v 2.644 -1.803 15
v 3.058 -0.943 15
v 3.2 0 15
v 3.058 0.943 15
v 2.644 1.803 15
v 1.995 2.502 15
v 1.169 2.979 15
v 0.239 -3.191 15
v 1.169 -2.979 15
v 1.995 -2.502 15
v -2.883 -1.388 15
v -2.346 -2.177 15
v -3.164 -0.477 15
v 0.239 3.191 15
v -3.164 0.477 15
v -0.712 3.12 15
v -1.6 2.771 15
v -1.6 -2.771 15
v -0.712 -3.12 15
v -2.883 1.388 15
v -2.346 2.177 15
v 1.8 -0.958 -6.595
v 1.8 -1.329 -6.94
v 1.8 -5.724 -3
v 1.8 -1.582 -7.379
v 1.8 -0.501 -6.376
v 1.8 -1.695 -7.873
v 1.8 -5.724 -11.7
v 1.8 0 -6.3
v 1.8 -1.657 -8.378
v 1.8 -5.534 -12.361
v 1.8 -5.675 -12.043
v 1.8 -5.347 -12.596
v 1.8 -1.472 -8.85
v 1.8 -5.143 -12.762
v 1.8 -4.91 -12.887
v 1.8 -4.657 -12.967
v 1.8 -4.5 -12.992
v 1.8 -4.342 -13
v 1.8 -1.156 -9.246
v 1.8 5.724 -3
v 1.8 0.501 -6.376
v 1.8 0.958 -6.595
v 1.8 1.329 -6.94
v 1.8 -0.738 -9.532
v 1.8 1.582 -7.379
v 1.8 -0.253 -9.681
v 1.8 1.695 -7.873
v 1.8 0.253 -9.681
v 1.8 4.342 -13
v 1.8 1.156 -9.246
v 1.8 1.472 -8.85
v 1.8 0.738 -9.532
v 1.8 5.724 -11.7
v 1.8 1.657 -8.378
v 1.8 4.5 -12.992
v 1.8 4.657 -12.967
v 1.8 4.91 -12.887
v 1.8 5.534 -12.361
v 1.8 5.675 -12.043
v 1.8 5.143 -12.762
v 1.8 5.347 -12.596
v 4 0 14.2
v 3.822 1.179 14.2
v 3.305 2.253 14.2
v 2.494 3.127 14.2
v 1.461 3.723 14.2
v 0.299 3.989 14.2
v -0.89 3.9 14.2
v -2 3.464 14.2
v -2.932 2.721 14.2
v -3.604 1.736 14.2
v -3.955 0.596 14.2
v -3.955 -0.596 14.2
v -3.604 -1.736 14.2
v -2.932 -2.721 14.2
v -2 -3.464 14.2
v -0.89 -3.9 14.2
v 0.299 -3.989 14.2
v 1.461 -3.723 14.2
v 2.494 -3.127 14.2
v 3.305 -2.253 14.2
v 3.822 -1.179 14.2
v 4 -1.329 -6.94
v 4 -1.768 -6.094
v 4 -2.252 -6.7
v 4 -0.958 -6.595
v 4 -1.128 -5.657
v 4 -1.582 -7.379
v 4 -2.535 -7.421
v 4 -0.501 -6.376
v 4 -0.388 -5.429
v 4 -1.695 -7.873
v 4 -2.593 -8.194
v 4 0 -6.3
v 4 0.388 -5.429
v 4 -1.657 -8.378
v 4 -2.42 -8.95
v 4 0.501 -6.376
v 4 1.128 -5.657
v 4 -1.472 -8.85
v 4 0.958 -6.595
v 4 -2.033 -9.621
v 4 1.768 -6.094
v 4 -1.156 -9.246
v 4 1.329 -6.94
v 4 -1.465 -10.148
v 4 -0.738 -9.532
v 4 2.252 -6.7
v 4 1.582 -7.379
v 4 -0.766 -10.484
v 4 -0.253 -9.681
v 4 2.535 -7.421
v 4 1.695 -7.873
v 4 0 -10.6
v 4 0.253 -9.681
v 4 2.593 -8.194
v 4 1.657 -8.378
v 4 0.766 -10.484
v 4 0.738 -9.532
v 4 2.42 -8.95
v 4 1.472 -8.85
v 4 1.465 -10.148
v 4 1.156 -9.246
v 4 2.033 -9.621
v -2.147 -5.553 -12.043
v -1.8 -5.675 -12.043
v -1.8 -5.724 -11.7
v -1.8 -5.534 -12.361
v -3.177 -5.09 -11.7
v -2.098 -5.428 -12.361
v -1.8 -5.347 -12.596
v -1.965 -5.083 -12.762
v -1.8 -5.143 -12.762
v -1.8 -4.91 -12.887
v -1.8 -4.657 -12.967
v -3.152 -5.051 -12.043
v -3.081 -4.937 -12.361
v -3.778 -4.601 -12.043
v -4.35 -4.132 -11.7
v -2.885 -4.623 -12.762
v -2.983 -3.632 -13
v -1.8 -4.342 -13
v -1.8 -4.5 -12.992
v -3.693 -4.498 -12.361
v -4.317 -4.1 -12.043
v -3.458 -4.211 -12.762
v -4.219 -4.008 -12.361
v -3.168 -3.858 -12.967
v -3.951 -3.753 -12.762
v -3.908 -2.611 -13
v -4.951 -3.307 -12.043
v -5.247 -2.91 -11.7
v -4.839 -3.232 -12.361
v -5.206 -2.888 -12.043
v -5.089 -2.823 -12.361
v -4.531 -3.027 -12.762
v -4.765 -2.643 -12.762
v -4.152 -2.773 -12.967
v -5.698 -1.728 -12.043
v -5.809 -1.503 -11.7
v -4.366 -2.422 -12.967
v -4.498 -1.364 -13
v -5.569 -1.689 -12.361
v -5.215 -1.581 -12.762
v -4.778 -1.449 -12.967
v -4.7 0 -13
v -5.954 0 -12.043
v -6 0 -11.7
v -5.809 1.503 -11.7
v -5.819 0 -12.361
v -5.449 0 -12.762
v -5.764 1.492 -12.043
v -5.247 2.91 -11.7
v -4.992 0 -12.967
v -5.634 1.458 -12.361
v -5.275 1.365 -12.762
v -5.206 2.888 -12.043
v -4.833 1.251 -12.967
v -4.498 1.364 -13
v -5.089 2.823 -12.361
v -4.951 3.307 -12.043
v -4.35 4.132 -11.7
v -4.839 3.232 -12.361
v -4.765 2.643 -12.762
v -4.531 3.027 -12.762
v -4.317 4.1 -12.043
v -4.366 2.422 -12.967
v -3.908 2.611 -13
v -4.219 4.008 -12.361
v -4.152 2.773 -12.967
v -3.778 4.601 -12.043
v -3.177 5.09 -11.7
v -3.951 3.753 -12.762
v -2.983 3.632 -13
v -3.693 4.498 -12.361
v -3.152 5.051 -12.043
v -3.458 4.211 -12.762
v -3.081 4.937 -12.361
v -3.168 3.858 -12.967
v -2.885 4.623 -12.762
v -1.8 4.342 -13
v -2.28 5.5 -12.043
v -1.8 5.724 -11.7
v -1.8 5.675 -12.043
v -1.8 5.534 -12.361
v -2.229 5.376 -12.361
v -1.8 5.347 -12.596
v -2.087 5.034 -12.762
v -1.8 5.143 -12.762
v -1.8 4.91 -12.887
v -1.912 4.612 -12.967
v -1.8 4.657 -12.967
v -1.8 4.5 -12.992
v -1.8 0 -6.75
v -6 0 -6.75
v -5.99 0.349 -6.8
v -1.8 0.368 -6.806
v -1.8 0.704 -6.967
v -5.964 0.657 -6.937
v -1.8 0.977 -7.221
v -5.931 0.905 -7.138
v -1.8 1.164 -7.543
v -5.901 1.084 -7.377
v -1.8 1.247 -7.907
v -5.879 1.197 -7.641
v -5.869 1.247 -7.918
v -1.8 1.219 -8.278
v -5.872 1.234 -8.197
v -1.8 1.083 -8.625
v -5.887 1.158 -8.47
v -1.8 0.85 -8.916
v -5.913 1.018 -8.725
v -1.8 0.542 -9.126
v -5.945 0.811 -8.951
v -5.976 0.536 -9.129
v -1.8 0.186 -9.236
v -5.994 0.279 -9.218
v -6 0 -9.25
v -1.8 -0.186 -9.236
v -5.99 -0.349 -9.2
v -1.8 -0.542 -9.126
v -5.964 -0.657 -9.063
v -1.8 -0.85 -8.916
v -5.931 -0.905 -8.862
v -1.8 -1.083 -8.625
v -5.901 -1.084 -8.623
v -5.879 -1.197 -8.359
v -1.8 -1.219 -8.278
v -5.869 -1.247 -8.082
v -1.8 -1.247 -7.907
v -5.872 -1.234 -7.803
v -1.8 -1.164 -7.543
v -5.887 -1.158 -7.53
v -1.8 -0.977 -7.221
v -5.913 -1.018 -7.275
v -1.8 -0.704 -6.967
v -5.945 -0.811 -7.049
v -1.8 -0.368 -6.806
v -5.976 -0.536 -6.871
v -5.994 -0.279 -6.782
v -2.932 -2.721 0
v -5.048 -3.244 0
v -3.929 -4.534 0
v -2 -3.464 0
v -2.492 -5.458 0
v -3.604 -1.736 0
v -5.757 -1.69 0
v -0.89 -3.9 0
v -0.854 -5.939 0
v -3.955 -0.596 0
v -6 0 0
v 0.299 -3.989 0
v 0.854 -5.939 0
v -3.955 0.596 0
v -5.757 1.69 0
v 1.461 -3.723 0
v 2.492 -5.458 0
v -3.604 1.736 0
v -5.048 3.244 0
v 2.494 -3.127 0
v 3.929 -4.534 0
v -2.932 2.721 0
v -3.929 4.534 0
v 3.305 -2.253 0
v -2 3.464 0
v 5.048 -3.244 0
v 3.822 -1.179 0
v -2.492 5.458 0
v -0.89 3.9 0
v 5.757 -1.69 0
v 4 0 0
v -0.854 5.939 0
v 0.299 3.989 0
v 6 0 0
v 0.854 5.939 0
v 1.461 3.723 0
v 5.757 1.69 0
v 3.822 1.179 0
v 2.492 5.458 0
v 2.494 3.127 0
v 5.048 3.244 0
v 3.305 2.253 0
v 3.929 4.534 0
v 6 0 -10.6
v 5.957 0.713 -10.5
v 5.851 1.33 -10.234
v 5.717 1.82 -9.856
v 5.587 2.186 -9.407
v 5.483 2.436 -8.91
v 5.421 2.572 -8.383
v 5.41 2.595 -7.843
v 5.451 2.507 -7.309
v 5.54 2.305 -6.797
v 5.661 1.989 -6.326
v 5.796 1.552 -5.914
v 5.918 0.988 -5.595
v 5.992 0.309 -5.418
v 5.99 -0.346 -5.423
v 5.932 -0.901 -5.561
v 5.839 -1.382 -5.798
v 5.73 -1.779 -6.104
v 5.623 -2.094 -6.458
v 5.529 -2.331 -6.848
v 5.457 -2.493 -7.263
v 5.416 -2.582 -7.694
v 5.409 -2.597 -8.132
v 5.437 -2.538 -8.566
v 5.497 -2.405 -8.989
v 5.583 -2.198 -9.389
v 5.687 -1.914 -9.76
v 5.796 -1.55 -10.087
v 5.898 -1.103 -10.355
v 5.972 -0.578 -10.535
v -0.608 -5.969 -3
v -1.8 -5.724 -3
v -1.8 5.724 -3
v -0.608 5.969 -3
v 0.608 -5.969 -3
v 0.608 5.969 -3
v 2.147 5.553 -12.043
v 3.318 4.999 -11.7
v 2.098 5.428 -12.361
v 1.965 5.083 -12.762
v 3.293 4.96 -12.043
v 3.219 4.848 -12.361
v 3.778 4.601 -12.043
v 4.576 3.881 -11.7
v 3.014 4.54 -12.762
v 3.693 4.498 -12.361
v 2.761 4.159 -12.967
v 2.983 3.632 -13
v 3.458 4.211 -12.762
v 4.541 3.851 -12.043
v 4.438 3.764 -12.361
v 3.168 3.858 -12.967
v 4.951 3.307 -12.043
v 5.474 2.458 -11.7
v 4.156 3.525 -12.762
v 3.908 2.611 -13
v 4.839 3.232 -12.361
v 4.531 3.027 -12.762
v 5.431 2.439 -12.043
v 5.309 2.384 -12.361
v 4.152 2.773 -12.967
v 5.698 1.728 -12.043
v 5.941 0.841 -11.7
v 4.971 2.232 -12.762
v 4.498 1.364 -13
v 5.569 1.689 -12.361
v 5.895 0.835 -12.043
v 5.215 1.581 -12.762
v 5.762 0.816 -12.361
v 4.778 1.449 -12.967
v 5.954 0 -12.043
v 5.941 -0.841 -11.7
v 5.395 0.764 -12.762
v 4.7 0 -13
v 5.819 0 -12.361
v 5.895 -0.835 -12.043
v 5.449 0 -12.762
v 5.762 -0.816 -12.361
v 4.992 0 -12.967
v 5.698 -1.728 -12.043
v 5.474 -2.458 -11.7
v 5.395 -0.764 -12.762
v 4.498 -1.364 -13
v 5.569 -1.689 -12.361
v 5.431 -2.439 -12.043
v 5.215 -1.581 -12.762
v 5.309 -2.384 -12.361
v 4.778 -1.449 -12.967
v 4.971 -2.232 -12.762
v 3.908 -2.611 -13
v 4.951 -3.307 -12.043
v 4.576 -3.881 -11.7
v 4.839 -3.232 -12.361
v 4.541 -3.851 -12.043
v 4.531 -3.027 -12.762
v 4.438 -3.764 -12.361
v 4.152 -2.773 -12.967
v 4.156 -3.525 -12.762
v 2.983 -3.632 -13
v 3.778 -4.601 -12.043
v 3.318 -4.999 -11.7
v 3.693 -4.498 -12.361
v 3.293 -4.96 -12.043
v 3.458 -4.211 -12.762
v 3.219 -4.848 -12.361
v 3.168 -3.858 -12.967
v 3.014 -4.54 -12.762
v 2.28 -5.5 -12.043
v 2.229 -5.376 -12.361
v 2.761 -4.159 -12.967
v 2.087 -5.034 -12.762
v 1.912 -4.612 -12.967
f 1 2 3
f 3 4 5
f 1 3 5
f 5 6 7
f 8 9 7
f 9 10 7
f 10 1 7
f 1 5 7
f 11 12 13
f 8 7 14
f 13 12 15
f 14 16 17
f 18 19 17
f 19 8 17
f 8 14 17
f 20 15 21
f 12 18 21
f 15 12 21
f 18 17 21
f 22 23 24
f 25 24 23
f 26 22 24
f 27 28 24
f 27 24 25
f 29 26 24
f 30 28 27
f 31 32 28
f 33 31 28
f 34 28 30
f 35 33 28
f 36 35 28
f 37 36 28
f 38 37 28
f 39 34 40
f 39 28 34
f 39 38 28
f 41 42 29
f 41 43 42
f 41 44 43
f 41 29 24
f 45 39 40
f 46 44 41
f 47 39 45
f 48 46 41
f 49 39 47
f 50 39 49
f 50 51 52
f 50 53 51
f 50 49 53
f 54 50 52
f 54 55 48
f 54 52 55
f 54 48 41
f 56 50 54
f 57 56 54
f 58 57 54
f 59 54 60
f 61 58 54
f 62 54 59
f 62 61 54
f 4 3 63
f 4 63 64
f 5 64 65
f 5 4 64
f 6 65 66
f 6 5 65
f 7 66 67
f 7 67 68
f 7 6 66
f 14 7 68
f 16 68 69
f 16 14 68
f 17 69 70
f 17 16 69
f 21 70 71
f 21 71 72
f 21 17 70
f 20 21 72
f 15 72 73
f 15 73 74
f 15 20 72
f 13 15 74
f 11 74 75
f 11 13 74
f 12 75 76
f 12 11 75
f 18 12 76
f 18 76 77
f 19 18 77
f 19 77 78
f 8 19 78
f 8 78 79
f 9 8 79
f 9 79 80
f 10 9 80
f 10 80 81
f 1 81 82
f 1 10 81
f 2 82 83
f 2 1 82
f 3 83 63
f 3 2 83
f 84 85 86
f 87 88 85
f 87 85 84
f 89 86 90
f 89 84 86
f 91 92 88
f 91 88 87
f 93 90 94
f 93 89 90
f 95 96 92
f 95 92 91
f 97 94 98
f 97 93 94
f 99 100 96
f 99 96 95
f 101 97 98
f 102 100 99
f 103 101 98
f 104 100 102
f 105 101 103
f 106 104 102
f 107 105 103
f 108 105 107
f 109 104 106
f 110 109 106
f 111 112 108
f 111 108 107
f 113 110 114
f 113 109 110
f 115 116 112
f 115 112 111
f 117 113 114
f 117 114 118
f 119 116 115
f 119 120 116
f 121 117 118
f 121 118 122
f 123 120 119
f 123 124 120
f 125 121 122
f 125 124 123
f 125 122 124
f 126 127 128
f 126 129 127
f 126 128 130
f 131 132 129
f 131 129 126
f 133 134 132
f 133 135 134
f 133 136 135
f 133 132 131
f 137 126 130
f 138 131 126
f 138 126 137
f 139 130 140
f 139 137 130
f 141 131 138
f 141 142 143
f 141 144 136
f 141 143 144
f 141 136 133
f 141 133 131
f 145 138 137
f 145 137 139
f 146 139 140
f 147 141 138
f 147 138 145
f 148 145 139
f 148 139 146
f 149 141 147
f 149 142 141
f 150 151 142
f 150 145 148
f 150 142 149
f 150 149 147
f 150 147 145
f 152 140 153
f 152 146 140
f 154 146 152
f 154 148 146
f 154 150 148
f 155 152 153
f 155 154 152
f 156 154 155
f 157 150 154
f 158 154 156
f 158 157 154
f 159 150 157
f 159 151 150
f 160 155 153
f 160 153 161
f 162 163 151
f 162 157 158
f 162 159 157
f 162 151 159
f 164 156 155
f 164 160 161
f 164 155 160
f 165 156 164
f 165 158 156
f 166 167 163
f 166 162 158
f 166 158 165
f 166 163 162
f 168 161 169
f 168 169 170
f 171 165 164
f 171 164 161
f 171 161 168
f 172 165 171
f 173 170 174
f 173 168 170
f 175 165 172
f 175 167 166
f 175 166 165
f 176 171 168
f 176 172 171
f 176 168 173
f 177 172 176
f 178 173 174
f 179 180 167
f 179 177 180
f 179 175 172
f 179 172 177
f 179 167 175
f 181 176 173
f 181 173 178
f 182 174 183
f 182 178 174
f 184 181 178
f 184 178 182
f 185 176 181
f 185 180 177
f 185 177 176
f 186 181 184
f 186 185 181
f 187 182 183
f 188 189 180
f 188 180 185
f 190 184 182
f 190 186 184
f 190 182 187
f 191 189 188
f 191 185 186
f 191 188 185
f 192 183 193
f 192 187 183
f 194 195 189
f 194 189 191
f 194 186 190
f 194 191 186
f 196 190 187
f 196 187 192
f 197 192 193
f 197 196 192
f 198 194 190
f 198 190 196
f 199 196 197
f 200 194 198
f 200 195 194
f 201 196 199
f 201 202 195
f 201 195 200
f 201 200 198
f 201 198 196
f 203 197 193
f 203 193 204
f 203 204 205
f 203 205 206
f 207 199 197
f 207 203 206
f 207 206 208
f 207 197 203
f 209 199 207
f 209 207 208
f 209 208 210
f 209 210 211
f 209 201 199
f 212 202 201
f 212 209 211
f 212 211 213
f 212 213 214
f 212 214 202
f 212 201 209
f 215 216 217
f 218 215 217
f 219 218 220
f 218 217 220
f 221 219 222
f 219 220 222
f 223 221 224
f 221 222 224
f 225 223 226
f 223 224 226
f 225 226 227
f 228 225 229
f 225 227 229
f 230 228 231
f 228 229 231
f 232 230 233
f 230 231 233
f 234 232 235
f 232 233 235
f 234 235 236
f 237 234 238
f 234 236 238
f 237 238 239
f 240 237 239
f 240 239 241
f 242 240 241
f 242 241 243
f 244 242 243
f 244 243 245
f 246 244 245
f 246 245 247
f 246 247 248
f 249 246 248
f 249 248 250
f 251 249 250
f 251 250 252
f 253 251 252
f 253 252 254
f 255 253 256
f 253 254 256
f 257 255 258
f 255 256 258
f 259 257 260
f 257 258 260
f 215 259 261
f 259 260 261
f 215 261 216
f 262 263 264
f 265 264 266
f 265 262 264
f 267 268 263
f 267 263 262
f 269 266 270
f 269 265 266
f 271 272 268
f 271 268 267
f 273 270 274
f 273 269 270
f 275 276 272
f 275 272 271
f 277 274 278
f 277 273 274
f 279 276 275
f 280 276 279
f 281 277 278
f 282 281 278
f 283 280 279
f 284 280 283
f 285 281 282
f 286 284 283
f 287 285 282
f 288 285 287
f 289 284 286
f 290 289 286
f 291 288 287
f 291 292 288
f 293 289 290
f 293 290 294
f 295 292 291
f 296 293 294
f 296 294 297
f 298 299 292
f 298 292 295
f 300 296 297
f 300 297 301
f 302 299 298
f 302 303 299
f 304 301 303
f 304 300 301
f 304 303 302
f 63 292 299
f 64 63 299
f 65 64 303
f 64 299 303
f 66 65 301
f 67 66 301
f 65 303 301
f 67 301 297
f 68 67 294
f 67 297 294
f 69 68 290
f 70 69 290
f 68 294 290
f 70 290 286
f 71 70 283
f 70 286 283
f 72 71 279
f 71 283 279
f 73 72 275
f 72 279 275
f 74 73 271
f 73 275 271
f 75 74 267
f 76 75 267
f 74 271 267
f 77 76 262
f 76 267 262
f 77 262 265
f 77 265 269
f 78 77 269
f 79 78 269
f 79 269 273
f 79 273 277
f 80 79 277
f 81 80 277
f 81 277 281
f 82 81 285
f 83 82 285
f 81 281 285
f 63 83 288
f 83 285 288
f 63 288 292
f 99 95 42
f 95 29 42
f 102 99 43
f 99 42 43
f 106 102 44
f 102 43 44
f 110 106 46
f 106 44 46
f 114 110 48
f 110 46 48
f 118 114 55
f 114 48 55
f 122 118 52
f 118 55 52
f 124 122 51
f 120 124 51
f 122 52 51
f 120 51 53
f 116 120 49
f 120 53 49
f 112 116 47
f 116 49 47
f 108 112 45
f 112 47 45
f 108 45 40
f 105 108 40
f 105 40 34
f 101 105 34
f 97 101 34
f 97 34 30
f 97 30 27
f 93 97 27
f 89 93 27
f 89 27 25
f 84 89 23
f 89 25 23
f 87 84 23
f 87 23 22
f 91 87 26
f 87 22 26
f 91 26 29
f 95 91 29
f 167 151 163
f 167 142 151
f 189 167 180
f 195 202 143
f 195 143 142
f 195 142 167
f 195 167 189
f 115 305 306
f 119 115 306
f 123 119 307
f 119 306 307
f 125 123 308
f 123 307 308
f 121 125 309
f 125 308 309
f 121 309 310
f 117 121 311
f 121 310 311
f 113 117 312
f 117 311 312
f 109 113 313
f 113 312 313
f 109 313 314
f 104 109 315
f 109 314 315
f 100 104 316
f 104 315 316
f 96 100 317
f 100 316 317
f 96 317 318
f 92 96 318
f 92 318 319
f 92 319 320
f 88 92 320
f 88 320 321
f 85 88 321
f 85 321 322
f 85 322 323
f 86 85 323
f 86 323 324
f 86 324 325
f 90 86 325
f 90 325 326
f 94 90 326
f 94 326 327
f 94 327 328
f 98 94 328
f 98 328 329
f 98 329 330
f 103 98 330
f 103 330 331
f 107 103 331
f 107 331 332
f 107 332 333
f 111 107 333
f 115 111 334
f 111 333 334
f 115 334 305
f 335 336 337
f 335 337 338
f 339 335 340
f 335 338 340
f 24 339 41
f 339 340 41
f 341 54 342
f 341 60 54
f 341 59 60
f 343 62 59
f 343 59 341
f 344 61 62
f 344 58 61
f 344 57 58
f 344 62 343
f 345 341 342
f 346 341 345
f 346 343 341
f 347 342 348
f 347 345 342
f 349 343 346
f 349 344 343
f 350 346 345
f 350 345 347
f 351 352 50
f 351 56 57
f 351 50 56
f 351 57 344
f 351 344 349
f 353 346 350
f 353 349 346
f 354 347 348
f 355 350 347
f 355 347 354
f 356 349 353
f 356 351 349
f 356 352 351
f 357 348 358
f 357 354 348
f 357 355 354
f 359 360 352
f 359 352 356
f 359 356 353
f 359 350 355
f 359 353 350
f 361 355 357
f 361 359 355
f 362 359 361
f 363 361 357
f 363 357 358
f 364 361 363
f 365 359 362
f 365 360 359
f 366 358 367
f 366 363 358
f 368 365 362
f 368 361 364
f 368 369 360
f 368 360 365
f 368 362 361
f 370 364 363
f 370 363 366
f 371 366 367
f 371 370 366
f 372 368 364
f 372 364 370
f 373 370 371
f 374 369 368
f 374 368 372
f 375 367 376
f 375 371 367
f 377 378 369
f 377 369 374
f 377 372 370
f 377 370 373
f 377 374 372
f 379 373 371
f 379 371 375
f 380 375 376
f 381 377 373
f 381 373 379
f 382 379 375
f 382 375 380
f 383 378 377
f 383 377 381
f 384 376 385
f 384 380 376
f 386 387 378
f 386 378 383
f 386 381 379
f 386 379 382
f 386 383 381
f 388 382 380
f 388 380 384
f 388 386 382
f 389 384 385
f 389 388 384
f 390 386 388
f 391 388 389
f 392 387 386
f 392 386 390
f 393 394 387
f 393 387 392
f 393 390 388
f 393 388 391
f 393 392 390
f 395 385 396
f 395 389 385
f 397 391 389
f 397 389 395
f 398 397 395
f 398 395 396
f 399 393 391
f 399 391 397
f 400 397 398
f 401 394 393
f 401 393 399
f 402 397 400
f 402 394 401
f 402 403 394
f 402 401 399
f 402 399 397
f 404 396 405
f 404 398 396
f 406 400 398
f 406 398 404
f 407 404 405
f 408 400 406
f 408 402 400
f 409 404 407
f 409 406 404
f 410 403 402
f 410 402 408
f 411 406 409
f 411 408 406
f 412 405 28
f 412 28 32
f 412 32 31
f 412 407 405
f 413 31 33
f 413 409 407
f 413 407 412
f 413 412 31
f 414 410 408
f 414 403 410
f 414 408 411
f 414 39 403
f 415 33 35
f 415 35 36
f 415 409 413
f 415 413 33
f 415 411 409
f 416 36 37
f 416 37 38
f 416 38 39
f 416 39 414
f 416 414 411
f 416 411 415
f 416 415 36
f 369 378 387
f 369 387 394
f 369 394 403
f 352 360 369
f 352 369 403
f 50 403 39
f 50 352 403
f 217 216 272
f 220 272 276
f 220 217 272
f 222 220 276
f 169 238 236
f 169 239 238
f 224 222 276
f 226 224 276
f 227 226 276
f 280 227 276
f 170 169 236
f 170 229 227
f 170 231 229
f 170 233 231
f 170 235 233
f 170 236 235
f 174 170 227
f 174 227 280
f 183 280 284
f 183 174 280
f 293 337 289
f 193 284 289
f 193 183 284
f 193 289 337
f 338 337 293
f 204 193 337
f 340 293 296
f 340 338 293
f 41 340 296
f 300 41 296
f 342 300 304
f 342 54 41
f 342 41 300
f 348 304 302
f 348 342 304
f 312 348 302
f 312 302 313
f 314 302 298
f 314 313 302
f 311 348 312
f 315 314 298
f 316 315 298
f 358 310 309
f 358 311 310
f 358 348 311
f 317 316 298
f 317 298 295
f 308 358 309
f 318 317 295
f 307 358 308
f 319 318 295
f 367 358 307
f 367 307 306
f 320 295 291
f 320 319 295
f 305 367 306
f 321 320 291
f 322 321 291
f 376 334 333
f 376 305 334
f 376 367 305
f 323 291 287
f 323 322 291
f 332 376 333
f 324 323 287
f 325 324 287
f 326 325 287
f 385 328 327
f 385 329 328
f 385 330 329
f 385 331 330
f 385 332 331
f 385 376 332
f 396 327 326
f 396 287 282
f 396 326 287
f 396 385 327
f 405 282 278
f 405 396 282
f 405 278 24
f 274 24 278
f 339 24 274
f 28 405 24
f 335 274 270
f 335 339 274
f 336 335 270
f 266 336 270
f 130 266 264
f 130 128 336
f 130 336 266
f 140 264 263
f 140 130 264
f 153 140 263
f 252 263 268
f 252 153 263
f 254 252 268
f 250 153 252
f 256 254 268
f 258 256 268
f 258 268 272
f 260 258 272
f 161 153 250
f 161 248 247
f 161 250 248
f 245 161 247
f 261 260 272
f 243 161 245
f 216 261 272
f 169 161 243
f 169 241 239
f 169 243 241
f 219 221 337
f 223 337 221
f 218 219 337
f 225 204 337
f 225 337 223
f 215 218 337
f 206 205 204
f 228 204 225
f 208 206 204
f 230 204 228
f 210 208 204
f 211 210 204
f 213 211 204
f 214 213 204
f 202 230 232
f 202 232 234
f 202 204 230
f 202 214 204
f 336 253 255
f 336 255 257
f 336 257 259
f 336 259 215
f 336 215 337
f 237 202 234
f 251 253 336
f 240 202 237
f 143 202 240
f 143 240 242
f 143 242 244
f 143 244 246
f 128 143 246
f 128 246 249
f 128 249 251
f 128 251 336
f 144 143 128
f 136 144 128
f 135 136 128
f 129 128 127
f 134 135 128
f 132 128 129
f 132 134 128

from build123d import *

# Parameters (mm, degrees)
ESQUISSE3_W                                        = 4
ESQUISSE3_H                                        = 15
CHANFREIN1_SIZE                                    = 0.8
ENL_V_MAT_EXTRU_3_DEPTH                            = 10
CHAMBRAGE_POUR_VIS_T_TE_HEXAGONALE_M31_D           = 3.4
CHAMBRAGE_POUR_VIS_T_TE_HEXAGONALE_M31_DEPTH       = 8
CHAMBRAGE_POUR_VIS_T_TE_HEXAGONALE_M31_CBORE_D     = 5.2
CHAMBRAGE_POUR_VIS_T_TE_HEXAGONALE_M31_CBORE_DEPTH = 3
CHAMBRAGE_POUR_VIS_T_TE_HEXAGONALE_M31_TIP         = 1.021463052
TROU_TARAUD_M31_D                                  = 2.5


with BuildPart() as part:
    # Esquisse1 → Base-Révolution (revolve)
    with BuildSketch(Plane(origin=(0, 0, 0), x_dir=(1, 0, 0), z_dir=(0, 1, 0))):
        with BuildLine():
            Line((0, 0), (6, 0))
            Line((6, 0), (6, 11.7))
            ThreePointArc((6, 11.7), (5.619238816, 12.619238816), (4.7, 13))
            Line((4.7, 13), (0, 13))
            Line((0, 13), (0, 0))
        make_face()
    revolve(axis=Axis((0, 0, 0), (0, 0, -1)))

    # Esquisse3 → Boss.-Révol.1 (revolve)
    with BuildSketch(Plane(origin=(0, 0, 0), x_dir=(1, 0, 0), z_dir=(0, 1, 0))):
        with Locations((2, -7.5)):
            Rectangle(ESQUISSE3_W, ESQUISSE3_H)
    revolve(axis=Axis((0, 0, 0), (0, 0, 1)))

    # Chanfrein1
    chanfrein1_edges = [part.edges().sort_by_distance(p)[0] for p in [
        (-4, 0, 15),
    ]]
    chamfer(chanfrein1_edges, length=CHANFREIN1_SIZE)

    # Esquisse2 → Enlèv. mat.-Extru.3 (cut)
    with BuildSketch(Plane.XY.offset(-13)):
        with BuildLine():
            Line((1.8, -5.723635209), (1.8, 5.723635209))
            ThreePointArc((1.8, 5.723635209), (0, 6), (-1.8, 5.723635209))
            Line((-1.8, 5.723635209), (-1.8, -5.723635209))
            ThreePointArc((-1.8, -5.723635209), (0, -6), (1.8, -5.723635209))
        make_face()
    extrude(amount=ENL_V_MAT_EXTRU_3_DEPTH, mode=Mode.SUBTRACT)

    # Chambrage pour vis à tête hexagonale M31
    with Locations(Plane(origin=(7, 0, 0), x_dir=(0, 0, -1), z_dir=(1, 0, 0))):
        with Locations((8, 0)):
            CounterBoreHole(CHAMBRAGE_POUR_VIS_T_TE_HEXAGONALE_M31_D / 2, CHAMBRAGE_POUR_VIS_T_TE_HEXAGONALE_M31_CBORE_D / 2, CHAMBRAGE_POUR_VIS_T_TE_HEXAGONALE_M31_CBORE_DEPTH, depth=CHAMBRAGE_POUR_VIS_T_TE_HEXAGONALE_M31_DEPTH)
            with Locations((0, 0, -(CHAMBRAGE_POUR_VIS_T_TE_HEXAGONALE_M31_DEPTH + CHAMBRAGE_POUR_VIS_T_TE_HEXAGONALE_M31_TIP / 2))):  # 118° drill point
                Cone(0, CHAMBRAGE_POUR_VIS_T_TE_HEXAGONALE_M31_D / 2, CHAMBRAGE_POUR_VIS_T_TE_HEXAGONALE_M31_TIP, mode=Mode.SUBTRACT)

    # Trou taraudé M31 (through all)
    with Locations(Plane(origin=(-1.8, 0, 0), x_dir=(0, 0, -1), z_dir=(1, 0, 0))):
        with Locations((8, 0)):
            Hole(TROU_TARAUD_M31_D / 2)


solid = part.part
